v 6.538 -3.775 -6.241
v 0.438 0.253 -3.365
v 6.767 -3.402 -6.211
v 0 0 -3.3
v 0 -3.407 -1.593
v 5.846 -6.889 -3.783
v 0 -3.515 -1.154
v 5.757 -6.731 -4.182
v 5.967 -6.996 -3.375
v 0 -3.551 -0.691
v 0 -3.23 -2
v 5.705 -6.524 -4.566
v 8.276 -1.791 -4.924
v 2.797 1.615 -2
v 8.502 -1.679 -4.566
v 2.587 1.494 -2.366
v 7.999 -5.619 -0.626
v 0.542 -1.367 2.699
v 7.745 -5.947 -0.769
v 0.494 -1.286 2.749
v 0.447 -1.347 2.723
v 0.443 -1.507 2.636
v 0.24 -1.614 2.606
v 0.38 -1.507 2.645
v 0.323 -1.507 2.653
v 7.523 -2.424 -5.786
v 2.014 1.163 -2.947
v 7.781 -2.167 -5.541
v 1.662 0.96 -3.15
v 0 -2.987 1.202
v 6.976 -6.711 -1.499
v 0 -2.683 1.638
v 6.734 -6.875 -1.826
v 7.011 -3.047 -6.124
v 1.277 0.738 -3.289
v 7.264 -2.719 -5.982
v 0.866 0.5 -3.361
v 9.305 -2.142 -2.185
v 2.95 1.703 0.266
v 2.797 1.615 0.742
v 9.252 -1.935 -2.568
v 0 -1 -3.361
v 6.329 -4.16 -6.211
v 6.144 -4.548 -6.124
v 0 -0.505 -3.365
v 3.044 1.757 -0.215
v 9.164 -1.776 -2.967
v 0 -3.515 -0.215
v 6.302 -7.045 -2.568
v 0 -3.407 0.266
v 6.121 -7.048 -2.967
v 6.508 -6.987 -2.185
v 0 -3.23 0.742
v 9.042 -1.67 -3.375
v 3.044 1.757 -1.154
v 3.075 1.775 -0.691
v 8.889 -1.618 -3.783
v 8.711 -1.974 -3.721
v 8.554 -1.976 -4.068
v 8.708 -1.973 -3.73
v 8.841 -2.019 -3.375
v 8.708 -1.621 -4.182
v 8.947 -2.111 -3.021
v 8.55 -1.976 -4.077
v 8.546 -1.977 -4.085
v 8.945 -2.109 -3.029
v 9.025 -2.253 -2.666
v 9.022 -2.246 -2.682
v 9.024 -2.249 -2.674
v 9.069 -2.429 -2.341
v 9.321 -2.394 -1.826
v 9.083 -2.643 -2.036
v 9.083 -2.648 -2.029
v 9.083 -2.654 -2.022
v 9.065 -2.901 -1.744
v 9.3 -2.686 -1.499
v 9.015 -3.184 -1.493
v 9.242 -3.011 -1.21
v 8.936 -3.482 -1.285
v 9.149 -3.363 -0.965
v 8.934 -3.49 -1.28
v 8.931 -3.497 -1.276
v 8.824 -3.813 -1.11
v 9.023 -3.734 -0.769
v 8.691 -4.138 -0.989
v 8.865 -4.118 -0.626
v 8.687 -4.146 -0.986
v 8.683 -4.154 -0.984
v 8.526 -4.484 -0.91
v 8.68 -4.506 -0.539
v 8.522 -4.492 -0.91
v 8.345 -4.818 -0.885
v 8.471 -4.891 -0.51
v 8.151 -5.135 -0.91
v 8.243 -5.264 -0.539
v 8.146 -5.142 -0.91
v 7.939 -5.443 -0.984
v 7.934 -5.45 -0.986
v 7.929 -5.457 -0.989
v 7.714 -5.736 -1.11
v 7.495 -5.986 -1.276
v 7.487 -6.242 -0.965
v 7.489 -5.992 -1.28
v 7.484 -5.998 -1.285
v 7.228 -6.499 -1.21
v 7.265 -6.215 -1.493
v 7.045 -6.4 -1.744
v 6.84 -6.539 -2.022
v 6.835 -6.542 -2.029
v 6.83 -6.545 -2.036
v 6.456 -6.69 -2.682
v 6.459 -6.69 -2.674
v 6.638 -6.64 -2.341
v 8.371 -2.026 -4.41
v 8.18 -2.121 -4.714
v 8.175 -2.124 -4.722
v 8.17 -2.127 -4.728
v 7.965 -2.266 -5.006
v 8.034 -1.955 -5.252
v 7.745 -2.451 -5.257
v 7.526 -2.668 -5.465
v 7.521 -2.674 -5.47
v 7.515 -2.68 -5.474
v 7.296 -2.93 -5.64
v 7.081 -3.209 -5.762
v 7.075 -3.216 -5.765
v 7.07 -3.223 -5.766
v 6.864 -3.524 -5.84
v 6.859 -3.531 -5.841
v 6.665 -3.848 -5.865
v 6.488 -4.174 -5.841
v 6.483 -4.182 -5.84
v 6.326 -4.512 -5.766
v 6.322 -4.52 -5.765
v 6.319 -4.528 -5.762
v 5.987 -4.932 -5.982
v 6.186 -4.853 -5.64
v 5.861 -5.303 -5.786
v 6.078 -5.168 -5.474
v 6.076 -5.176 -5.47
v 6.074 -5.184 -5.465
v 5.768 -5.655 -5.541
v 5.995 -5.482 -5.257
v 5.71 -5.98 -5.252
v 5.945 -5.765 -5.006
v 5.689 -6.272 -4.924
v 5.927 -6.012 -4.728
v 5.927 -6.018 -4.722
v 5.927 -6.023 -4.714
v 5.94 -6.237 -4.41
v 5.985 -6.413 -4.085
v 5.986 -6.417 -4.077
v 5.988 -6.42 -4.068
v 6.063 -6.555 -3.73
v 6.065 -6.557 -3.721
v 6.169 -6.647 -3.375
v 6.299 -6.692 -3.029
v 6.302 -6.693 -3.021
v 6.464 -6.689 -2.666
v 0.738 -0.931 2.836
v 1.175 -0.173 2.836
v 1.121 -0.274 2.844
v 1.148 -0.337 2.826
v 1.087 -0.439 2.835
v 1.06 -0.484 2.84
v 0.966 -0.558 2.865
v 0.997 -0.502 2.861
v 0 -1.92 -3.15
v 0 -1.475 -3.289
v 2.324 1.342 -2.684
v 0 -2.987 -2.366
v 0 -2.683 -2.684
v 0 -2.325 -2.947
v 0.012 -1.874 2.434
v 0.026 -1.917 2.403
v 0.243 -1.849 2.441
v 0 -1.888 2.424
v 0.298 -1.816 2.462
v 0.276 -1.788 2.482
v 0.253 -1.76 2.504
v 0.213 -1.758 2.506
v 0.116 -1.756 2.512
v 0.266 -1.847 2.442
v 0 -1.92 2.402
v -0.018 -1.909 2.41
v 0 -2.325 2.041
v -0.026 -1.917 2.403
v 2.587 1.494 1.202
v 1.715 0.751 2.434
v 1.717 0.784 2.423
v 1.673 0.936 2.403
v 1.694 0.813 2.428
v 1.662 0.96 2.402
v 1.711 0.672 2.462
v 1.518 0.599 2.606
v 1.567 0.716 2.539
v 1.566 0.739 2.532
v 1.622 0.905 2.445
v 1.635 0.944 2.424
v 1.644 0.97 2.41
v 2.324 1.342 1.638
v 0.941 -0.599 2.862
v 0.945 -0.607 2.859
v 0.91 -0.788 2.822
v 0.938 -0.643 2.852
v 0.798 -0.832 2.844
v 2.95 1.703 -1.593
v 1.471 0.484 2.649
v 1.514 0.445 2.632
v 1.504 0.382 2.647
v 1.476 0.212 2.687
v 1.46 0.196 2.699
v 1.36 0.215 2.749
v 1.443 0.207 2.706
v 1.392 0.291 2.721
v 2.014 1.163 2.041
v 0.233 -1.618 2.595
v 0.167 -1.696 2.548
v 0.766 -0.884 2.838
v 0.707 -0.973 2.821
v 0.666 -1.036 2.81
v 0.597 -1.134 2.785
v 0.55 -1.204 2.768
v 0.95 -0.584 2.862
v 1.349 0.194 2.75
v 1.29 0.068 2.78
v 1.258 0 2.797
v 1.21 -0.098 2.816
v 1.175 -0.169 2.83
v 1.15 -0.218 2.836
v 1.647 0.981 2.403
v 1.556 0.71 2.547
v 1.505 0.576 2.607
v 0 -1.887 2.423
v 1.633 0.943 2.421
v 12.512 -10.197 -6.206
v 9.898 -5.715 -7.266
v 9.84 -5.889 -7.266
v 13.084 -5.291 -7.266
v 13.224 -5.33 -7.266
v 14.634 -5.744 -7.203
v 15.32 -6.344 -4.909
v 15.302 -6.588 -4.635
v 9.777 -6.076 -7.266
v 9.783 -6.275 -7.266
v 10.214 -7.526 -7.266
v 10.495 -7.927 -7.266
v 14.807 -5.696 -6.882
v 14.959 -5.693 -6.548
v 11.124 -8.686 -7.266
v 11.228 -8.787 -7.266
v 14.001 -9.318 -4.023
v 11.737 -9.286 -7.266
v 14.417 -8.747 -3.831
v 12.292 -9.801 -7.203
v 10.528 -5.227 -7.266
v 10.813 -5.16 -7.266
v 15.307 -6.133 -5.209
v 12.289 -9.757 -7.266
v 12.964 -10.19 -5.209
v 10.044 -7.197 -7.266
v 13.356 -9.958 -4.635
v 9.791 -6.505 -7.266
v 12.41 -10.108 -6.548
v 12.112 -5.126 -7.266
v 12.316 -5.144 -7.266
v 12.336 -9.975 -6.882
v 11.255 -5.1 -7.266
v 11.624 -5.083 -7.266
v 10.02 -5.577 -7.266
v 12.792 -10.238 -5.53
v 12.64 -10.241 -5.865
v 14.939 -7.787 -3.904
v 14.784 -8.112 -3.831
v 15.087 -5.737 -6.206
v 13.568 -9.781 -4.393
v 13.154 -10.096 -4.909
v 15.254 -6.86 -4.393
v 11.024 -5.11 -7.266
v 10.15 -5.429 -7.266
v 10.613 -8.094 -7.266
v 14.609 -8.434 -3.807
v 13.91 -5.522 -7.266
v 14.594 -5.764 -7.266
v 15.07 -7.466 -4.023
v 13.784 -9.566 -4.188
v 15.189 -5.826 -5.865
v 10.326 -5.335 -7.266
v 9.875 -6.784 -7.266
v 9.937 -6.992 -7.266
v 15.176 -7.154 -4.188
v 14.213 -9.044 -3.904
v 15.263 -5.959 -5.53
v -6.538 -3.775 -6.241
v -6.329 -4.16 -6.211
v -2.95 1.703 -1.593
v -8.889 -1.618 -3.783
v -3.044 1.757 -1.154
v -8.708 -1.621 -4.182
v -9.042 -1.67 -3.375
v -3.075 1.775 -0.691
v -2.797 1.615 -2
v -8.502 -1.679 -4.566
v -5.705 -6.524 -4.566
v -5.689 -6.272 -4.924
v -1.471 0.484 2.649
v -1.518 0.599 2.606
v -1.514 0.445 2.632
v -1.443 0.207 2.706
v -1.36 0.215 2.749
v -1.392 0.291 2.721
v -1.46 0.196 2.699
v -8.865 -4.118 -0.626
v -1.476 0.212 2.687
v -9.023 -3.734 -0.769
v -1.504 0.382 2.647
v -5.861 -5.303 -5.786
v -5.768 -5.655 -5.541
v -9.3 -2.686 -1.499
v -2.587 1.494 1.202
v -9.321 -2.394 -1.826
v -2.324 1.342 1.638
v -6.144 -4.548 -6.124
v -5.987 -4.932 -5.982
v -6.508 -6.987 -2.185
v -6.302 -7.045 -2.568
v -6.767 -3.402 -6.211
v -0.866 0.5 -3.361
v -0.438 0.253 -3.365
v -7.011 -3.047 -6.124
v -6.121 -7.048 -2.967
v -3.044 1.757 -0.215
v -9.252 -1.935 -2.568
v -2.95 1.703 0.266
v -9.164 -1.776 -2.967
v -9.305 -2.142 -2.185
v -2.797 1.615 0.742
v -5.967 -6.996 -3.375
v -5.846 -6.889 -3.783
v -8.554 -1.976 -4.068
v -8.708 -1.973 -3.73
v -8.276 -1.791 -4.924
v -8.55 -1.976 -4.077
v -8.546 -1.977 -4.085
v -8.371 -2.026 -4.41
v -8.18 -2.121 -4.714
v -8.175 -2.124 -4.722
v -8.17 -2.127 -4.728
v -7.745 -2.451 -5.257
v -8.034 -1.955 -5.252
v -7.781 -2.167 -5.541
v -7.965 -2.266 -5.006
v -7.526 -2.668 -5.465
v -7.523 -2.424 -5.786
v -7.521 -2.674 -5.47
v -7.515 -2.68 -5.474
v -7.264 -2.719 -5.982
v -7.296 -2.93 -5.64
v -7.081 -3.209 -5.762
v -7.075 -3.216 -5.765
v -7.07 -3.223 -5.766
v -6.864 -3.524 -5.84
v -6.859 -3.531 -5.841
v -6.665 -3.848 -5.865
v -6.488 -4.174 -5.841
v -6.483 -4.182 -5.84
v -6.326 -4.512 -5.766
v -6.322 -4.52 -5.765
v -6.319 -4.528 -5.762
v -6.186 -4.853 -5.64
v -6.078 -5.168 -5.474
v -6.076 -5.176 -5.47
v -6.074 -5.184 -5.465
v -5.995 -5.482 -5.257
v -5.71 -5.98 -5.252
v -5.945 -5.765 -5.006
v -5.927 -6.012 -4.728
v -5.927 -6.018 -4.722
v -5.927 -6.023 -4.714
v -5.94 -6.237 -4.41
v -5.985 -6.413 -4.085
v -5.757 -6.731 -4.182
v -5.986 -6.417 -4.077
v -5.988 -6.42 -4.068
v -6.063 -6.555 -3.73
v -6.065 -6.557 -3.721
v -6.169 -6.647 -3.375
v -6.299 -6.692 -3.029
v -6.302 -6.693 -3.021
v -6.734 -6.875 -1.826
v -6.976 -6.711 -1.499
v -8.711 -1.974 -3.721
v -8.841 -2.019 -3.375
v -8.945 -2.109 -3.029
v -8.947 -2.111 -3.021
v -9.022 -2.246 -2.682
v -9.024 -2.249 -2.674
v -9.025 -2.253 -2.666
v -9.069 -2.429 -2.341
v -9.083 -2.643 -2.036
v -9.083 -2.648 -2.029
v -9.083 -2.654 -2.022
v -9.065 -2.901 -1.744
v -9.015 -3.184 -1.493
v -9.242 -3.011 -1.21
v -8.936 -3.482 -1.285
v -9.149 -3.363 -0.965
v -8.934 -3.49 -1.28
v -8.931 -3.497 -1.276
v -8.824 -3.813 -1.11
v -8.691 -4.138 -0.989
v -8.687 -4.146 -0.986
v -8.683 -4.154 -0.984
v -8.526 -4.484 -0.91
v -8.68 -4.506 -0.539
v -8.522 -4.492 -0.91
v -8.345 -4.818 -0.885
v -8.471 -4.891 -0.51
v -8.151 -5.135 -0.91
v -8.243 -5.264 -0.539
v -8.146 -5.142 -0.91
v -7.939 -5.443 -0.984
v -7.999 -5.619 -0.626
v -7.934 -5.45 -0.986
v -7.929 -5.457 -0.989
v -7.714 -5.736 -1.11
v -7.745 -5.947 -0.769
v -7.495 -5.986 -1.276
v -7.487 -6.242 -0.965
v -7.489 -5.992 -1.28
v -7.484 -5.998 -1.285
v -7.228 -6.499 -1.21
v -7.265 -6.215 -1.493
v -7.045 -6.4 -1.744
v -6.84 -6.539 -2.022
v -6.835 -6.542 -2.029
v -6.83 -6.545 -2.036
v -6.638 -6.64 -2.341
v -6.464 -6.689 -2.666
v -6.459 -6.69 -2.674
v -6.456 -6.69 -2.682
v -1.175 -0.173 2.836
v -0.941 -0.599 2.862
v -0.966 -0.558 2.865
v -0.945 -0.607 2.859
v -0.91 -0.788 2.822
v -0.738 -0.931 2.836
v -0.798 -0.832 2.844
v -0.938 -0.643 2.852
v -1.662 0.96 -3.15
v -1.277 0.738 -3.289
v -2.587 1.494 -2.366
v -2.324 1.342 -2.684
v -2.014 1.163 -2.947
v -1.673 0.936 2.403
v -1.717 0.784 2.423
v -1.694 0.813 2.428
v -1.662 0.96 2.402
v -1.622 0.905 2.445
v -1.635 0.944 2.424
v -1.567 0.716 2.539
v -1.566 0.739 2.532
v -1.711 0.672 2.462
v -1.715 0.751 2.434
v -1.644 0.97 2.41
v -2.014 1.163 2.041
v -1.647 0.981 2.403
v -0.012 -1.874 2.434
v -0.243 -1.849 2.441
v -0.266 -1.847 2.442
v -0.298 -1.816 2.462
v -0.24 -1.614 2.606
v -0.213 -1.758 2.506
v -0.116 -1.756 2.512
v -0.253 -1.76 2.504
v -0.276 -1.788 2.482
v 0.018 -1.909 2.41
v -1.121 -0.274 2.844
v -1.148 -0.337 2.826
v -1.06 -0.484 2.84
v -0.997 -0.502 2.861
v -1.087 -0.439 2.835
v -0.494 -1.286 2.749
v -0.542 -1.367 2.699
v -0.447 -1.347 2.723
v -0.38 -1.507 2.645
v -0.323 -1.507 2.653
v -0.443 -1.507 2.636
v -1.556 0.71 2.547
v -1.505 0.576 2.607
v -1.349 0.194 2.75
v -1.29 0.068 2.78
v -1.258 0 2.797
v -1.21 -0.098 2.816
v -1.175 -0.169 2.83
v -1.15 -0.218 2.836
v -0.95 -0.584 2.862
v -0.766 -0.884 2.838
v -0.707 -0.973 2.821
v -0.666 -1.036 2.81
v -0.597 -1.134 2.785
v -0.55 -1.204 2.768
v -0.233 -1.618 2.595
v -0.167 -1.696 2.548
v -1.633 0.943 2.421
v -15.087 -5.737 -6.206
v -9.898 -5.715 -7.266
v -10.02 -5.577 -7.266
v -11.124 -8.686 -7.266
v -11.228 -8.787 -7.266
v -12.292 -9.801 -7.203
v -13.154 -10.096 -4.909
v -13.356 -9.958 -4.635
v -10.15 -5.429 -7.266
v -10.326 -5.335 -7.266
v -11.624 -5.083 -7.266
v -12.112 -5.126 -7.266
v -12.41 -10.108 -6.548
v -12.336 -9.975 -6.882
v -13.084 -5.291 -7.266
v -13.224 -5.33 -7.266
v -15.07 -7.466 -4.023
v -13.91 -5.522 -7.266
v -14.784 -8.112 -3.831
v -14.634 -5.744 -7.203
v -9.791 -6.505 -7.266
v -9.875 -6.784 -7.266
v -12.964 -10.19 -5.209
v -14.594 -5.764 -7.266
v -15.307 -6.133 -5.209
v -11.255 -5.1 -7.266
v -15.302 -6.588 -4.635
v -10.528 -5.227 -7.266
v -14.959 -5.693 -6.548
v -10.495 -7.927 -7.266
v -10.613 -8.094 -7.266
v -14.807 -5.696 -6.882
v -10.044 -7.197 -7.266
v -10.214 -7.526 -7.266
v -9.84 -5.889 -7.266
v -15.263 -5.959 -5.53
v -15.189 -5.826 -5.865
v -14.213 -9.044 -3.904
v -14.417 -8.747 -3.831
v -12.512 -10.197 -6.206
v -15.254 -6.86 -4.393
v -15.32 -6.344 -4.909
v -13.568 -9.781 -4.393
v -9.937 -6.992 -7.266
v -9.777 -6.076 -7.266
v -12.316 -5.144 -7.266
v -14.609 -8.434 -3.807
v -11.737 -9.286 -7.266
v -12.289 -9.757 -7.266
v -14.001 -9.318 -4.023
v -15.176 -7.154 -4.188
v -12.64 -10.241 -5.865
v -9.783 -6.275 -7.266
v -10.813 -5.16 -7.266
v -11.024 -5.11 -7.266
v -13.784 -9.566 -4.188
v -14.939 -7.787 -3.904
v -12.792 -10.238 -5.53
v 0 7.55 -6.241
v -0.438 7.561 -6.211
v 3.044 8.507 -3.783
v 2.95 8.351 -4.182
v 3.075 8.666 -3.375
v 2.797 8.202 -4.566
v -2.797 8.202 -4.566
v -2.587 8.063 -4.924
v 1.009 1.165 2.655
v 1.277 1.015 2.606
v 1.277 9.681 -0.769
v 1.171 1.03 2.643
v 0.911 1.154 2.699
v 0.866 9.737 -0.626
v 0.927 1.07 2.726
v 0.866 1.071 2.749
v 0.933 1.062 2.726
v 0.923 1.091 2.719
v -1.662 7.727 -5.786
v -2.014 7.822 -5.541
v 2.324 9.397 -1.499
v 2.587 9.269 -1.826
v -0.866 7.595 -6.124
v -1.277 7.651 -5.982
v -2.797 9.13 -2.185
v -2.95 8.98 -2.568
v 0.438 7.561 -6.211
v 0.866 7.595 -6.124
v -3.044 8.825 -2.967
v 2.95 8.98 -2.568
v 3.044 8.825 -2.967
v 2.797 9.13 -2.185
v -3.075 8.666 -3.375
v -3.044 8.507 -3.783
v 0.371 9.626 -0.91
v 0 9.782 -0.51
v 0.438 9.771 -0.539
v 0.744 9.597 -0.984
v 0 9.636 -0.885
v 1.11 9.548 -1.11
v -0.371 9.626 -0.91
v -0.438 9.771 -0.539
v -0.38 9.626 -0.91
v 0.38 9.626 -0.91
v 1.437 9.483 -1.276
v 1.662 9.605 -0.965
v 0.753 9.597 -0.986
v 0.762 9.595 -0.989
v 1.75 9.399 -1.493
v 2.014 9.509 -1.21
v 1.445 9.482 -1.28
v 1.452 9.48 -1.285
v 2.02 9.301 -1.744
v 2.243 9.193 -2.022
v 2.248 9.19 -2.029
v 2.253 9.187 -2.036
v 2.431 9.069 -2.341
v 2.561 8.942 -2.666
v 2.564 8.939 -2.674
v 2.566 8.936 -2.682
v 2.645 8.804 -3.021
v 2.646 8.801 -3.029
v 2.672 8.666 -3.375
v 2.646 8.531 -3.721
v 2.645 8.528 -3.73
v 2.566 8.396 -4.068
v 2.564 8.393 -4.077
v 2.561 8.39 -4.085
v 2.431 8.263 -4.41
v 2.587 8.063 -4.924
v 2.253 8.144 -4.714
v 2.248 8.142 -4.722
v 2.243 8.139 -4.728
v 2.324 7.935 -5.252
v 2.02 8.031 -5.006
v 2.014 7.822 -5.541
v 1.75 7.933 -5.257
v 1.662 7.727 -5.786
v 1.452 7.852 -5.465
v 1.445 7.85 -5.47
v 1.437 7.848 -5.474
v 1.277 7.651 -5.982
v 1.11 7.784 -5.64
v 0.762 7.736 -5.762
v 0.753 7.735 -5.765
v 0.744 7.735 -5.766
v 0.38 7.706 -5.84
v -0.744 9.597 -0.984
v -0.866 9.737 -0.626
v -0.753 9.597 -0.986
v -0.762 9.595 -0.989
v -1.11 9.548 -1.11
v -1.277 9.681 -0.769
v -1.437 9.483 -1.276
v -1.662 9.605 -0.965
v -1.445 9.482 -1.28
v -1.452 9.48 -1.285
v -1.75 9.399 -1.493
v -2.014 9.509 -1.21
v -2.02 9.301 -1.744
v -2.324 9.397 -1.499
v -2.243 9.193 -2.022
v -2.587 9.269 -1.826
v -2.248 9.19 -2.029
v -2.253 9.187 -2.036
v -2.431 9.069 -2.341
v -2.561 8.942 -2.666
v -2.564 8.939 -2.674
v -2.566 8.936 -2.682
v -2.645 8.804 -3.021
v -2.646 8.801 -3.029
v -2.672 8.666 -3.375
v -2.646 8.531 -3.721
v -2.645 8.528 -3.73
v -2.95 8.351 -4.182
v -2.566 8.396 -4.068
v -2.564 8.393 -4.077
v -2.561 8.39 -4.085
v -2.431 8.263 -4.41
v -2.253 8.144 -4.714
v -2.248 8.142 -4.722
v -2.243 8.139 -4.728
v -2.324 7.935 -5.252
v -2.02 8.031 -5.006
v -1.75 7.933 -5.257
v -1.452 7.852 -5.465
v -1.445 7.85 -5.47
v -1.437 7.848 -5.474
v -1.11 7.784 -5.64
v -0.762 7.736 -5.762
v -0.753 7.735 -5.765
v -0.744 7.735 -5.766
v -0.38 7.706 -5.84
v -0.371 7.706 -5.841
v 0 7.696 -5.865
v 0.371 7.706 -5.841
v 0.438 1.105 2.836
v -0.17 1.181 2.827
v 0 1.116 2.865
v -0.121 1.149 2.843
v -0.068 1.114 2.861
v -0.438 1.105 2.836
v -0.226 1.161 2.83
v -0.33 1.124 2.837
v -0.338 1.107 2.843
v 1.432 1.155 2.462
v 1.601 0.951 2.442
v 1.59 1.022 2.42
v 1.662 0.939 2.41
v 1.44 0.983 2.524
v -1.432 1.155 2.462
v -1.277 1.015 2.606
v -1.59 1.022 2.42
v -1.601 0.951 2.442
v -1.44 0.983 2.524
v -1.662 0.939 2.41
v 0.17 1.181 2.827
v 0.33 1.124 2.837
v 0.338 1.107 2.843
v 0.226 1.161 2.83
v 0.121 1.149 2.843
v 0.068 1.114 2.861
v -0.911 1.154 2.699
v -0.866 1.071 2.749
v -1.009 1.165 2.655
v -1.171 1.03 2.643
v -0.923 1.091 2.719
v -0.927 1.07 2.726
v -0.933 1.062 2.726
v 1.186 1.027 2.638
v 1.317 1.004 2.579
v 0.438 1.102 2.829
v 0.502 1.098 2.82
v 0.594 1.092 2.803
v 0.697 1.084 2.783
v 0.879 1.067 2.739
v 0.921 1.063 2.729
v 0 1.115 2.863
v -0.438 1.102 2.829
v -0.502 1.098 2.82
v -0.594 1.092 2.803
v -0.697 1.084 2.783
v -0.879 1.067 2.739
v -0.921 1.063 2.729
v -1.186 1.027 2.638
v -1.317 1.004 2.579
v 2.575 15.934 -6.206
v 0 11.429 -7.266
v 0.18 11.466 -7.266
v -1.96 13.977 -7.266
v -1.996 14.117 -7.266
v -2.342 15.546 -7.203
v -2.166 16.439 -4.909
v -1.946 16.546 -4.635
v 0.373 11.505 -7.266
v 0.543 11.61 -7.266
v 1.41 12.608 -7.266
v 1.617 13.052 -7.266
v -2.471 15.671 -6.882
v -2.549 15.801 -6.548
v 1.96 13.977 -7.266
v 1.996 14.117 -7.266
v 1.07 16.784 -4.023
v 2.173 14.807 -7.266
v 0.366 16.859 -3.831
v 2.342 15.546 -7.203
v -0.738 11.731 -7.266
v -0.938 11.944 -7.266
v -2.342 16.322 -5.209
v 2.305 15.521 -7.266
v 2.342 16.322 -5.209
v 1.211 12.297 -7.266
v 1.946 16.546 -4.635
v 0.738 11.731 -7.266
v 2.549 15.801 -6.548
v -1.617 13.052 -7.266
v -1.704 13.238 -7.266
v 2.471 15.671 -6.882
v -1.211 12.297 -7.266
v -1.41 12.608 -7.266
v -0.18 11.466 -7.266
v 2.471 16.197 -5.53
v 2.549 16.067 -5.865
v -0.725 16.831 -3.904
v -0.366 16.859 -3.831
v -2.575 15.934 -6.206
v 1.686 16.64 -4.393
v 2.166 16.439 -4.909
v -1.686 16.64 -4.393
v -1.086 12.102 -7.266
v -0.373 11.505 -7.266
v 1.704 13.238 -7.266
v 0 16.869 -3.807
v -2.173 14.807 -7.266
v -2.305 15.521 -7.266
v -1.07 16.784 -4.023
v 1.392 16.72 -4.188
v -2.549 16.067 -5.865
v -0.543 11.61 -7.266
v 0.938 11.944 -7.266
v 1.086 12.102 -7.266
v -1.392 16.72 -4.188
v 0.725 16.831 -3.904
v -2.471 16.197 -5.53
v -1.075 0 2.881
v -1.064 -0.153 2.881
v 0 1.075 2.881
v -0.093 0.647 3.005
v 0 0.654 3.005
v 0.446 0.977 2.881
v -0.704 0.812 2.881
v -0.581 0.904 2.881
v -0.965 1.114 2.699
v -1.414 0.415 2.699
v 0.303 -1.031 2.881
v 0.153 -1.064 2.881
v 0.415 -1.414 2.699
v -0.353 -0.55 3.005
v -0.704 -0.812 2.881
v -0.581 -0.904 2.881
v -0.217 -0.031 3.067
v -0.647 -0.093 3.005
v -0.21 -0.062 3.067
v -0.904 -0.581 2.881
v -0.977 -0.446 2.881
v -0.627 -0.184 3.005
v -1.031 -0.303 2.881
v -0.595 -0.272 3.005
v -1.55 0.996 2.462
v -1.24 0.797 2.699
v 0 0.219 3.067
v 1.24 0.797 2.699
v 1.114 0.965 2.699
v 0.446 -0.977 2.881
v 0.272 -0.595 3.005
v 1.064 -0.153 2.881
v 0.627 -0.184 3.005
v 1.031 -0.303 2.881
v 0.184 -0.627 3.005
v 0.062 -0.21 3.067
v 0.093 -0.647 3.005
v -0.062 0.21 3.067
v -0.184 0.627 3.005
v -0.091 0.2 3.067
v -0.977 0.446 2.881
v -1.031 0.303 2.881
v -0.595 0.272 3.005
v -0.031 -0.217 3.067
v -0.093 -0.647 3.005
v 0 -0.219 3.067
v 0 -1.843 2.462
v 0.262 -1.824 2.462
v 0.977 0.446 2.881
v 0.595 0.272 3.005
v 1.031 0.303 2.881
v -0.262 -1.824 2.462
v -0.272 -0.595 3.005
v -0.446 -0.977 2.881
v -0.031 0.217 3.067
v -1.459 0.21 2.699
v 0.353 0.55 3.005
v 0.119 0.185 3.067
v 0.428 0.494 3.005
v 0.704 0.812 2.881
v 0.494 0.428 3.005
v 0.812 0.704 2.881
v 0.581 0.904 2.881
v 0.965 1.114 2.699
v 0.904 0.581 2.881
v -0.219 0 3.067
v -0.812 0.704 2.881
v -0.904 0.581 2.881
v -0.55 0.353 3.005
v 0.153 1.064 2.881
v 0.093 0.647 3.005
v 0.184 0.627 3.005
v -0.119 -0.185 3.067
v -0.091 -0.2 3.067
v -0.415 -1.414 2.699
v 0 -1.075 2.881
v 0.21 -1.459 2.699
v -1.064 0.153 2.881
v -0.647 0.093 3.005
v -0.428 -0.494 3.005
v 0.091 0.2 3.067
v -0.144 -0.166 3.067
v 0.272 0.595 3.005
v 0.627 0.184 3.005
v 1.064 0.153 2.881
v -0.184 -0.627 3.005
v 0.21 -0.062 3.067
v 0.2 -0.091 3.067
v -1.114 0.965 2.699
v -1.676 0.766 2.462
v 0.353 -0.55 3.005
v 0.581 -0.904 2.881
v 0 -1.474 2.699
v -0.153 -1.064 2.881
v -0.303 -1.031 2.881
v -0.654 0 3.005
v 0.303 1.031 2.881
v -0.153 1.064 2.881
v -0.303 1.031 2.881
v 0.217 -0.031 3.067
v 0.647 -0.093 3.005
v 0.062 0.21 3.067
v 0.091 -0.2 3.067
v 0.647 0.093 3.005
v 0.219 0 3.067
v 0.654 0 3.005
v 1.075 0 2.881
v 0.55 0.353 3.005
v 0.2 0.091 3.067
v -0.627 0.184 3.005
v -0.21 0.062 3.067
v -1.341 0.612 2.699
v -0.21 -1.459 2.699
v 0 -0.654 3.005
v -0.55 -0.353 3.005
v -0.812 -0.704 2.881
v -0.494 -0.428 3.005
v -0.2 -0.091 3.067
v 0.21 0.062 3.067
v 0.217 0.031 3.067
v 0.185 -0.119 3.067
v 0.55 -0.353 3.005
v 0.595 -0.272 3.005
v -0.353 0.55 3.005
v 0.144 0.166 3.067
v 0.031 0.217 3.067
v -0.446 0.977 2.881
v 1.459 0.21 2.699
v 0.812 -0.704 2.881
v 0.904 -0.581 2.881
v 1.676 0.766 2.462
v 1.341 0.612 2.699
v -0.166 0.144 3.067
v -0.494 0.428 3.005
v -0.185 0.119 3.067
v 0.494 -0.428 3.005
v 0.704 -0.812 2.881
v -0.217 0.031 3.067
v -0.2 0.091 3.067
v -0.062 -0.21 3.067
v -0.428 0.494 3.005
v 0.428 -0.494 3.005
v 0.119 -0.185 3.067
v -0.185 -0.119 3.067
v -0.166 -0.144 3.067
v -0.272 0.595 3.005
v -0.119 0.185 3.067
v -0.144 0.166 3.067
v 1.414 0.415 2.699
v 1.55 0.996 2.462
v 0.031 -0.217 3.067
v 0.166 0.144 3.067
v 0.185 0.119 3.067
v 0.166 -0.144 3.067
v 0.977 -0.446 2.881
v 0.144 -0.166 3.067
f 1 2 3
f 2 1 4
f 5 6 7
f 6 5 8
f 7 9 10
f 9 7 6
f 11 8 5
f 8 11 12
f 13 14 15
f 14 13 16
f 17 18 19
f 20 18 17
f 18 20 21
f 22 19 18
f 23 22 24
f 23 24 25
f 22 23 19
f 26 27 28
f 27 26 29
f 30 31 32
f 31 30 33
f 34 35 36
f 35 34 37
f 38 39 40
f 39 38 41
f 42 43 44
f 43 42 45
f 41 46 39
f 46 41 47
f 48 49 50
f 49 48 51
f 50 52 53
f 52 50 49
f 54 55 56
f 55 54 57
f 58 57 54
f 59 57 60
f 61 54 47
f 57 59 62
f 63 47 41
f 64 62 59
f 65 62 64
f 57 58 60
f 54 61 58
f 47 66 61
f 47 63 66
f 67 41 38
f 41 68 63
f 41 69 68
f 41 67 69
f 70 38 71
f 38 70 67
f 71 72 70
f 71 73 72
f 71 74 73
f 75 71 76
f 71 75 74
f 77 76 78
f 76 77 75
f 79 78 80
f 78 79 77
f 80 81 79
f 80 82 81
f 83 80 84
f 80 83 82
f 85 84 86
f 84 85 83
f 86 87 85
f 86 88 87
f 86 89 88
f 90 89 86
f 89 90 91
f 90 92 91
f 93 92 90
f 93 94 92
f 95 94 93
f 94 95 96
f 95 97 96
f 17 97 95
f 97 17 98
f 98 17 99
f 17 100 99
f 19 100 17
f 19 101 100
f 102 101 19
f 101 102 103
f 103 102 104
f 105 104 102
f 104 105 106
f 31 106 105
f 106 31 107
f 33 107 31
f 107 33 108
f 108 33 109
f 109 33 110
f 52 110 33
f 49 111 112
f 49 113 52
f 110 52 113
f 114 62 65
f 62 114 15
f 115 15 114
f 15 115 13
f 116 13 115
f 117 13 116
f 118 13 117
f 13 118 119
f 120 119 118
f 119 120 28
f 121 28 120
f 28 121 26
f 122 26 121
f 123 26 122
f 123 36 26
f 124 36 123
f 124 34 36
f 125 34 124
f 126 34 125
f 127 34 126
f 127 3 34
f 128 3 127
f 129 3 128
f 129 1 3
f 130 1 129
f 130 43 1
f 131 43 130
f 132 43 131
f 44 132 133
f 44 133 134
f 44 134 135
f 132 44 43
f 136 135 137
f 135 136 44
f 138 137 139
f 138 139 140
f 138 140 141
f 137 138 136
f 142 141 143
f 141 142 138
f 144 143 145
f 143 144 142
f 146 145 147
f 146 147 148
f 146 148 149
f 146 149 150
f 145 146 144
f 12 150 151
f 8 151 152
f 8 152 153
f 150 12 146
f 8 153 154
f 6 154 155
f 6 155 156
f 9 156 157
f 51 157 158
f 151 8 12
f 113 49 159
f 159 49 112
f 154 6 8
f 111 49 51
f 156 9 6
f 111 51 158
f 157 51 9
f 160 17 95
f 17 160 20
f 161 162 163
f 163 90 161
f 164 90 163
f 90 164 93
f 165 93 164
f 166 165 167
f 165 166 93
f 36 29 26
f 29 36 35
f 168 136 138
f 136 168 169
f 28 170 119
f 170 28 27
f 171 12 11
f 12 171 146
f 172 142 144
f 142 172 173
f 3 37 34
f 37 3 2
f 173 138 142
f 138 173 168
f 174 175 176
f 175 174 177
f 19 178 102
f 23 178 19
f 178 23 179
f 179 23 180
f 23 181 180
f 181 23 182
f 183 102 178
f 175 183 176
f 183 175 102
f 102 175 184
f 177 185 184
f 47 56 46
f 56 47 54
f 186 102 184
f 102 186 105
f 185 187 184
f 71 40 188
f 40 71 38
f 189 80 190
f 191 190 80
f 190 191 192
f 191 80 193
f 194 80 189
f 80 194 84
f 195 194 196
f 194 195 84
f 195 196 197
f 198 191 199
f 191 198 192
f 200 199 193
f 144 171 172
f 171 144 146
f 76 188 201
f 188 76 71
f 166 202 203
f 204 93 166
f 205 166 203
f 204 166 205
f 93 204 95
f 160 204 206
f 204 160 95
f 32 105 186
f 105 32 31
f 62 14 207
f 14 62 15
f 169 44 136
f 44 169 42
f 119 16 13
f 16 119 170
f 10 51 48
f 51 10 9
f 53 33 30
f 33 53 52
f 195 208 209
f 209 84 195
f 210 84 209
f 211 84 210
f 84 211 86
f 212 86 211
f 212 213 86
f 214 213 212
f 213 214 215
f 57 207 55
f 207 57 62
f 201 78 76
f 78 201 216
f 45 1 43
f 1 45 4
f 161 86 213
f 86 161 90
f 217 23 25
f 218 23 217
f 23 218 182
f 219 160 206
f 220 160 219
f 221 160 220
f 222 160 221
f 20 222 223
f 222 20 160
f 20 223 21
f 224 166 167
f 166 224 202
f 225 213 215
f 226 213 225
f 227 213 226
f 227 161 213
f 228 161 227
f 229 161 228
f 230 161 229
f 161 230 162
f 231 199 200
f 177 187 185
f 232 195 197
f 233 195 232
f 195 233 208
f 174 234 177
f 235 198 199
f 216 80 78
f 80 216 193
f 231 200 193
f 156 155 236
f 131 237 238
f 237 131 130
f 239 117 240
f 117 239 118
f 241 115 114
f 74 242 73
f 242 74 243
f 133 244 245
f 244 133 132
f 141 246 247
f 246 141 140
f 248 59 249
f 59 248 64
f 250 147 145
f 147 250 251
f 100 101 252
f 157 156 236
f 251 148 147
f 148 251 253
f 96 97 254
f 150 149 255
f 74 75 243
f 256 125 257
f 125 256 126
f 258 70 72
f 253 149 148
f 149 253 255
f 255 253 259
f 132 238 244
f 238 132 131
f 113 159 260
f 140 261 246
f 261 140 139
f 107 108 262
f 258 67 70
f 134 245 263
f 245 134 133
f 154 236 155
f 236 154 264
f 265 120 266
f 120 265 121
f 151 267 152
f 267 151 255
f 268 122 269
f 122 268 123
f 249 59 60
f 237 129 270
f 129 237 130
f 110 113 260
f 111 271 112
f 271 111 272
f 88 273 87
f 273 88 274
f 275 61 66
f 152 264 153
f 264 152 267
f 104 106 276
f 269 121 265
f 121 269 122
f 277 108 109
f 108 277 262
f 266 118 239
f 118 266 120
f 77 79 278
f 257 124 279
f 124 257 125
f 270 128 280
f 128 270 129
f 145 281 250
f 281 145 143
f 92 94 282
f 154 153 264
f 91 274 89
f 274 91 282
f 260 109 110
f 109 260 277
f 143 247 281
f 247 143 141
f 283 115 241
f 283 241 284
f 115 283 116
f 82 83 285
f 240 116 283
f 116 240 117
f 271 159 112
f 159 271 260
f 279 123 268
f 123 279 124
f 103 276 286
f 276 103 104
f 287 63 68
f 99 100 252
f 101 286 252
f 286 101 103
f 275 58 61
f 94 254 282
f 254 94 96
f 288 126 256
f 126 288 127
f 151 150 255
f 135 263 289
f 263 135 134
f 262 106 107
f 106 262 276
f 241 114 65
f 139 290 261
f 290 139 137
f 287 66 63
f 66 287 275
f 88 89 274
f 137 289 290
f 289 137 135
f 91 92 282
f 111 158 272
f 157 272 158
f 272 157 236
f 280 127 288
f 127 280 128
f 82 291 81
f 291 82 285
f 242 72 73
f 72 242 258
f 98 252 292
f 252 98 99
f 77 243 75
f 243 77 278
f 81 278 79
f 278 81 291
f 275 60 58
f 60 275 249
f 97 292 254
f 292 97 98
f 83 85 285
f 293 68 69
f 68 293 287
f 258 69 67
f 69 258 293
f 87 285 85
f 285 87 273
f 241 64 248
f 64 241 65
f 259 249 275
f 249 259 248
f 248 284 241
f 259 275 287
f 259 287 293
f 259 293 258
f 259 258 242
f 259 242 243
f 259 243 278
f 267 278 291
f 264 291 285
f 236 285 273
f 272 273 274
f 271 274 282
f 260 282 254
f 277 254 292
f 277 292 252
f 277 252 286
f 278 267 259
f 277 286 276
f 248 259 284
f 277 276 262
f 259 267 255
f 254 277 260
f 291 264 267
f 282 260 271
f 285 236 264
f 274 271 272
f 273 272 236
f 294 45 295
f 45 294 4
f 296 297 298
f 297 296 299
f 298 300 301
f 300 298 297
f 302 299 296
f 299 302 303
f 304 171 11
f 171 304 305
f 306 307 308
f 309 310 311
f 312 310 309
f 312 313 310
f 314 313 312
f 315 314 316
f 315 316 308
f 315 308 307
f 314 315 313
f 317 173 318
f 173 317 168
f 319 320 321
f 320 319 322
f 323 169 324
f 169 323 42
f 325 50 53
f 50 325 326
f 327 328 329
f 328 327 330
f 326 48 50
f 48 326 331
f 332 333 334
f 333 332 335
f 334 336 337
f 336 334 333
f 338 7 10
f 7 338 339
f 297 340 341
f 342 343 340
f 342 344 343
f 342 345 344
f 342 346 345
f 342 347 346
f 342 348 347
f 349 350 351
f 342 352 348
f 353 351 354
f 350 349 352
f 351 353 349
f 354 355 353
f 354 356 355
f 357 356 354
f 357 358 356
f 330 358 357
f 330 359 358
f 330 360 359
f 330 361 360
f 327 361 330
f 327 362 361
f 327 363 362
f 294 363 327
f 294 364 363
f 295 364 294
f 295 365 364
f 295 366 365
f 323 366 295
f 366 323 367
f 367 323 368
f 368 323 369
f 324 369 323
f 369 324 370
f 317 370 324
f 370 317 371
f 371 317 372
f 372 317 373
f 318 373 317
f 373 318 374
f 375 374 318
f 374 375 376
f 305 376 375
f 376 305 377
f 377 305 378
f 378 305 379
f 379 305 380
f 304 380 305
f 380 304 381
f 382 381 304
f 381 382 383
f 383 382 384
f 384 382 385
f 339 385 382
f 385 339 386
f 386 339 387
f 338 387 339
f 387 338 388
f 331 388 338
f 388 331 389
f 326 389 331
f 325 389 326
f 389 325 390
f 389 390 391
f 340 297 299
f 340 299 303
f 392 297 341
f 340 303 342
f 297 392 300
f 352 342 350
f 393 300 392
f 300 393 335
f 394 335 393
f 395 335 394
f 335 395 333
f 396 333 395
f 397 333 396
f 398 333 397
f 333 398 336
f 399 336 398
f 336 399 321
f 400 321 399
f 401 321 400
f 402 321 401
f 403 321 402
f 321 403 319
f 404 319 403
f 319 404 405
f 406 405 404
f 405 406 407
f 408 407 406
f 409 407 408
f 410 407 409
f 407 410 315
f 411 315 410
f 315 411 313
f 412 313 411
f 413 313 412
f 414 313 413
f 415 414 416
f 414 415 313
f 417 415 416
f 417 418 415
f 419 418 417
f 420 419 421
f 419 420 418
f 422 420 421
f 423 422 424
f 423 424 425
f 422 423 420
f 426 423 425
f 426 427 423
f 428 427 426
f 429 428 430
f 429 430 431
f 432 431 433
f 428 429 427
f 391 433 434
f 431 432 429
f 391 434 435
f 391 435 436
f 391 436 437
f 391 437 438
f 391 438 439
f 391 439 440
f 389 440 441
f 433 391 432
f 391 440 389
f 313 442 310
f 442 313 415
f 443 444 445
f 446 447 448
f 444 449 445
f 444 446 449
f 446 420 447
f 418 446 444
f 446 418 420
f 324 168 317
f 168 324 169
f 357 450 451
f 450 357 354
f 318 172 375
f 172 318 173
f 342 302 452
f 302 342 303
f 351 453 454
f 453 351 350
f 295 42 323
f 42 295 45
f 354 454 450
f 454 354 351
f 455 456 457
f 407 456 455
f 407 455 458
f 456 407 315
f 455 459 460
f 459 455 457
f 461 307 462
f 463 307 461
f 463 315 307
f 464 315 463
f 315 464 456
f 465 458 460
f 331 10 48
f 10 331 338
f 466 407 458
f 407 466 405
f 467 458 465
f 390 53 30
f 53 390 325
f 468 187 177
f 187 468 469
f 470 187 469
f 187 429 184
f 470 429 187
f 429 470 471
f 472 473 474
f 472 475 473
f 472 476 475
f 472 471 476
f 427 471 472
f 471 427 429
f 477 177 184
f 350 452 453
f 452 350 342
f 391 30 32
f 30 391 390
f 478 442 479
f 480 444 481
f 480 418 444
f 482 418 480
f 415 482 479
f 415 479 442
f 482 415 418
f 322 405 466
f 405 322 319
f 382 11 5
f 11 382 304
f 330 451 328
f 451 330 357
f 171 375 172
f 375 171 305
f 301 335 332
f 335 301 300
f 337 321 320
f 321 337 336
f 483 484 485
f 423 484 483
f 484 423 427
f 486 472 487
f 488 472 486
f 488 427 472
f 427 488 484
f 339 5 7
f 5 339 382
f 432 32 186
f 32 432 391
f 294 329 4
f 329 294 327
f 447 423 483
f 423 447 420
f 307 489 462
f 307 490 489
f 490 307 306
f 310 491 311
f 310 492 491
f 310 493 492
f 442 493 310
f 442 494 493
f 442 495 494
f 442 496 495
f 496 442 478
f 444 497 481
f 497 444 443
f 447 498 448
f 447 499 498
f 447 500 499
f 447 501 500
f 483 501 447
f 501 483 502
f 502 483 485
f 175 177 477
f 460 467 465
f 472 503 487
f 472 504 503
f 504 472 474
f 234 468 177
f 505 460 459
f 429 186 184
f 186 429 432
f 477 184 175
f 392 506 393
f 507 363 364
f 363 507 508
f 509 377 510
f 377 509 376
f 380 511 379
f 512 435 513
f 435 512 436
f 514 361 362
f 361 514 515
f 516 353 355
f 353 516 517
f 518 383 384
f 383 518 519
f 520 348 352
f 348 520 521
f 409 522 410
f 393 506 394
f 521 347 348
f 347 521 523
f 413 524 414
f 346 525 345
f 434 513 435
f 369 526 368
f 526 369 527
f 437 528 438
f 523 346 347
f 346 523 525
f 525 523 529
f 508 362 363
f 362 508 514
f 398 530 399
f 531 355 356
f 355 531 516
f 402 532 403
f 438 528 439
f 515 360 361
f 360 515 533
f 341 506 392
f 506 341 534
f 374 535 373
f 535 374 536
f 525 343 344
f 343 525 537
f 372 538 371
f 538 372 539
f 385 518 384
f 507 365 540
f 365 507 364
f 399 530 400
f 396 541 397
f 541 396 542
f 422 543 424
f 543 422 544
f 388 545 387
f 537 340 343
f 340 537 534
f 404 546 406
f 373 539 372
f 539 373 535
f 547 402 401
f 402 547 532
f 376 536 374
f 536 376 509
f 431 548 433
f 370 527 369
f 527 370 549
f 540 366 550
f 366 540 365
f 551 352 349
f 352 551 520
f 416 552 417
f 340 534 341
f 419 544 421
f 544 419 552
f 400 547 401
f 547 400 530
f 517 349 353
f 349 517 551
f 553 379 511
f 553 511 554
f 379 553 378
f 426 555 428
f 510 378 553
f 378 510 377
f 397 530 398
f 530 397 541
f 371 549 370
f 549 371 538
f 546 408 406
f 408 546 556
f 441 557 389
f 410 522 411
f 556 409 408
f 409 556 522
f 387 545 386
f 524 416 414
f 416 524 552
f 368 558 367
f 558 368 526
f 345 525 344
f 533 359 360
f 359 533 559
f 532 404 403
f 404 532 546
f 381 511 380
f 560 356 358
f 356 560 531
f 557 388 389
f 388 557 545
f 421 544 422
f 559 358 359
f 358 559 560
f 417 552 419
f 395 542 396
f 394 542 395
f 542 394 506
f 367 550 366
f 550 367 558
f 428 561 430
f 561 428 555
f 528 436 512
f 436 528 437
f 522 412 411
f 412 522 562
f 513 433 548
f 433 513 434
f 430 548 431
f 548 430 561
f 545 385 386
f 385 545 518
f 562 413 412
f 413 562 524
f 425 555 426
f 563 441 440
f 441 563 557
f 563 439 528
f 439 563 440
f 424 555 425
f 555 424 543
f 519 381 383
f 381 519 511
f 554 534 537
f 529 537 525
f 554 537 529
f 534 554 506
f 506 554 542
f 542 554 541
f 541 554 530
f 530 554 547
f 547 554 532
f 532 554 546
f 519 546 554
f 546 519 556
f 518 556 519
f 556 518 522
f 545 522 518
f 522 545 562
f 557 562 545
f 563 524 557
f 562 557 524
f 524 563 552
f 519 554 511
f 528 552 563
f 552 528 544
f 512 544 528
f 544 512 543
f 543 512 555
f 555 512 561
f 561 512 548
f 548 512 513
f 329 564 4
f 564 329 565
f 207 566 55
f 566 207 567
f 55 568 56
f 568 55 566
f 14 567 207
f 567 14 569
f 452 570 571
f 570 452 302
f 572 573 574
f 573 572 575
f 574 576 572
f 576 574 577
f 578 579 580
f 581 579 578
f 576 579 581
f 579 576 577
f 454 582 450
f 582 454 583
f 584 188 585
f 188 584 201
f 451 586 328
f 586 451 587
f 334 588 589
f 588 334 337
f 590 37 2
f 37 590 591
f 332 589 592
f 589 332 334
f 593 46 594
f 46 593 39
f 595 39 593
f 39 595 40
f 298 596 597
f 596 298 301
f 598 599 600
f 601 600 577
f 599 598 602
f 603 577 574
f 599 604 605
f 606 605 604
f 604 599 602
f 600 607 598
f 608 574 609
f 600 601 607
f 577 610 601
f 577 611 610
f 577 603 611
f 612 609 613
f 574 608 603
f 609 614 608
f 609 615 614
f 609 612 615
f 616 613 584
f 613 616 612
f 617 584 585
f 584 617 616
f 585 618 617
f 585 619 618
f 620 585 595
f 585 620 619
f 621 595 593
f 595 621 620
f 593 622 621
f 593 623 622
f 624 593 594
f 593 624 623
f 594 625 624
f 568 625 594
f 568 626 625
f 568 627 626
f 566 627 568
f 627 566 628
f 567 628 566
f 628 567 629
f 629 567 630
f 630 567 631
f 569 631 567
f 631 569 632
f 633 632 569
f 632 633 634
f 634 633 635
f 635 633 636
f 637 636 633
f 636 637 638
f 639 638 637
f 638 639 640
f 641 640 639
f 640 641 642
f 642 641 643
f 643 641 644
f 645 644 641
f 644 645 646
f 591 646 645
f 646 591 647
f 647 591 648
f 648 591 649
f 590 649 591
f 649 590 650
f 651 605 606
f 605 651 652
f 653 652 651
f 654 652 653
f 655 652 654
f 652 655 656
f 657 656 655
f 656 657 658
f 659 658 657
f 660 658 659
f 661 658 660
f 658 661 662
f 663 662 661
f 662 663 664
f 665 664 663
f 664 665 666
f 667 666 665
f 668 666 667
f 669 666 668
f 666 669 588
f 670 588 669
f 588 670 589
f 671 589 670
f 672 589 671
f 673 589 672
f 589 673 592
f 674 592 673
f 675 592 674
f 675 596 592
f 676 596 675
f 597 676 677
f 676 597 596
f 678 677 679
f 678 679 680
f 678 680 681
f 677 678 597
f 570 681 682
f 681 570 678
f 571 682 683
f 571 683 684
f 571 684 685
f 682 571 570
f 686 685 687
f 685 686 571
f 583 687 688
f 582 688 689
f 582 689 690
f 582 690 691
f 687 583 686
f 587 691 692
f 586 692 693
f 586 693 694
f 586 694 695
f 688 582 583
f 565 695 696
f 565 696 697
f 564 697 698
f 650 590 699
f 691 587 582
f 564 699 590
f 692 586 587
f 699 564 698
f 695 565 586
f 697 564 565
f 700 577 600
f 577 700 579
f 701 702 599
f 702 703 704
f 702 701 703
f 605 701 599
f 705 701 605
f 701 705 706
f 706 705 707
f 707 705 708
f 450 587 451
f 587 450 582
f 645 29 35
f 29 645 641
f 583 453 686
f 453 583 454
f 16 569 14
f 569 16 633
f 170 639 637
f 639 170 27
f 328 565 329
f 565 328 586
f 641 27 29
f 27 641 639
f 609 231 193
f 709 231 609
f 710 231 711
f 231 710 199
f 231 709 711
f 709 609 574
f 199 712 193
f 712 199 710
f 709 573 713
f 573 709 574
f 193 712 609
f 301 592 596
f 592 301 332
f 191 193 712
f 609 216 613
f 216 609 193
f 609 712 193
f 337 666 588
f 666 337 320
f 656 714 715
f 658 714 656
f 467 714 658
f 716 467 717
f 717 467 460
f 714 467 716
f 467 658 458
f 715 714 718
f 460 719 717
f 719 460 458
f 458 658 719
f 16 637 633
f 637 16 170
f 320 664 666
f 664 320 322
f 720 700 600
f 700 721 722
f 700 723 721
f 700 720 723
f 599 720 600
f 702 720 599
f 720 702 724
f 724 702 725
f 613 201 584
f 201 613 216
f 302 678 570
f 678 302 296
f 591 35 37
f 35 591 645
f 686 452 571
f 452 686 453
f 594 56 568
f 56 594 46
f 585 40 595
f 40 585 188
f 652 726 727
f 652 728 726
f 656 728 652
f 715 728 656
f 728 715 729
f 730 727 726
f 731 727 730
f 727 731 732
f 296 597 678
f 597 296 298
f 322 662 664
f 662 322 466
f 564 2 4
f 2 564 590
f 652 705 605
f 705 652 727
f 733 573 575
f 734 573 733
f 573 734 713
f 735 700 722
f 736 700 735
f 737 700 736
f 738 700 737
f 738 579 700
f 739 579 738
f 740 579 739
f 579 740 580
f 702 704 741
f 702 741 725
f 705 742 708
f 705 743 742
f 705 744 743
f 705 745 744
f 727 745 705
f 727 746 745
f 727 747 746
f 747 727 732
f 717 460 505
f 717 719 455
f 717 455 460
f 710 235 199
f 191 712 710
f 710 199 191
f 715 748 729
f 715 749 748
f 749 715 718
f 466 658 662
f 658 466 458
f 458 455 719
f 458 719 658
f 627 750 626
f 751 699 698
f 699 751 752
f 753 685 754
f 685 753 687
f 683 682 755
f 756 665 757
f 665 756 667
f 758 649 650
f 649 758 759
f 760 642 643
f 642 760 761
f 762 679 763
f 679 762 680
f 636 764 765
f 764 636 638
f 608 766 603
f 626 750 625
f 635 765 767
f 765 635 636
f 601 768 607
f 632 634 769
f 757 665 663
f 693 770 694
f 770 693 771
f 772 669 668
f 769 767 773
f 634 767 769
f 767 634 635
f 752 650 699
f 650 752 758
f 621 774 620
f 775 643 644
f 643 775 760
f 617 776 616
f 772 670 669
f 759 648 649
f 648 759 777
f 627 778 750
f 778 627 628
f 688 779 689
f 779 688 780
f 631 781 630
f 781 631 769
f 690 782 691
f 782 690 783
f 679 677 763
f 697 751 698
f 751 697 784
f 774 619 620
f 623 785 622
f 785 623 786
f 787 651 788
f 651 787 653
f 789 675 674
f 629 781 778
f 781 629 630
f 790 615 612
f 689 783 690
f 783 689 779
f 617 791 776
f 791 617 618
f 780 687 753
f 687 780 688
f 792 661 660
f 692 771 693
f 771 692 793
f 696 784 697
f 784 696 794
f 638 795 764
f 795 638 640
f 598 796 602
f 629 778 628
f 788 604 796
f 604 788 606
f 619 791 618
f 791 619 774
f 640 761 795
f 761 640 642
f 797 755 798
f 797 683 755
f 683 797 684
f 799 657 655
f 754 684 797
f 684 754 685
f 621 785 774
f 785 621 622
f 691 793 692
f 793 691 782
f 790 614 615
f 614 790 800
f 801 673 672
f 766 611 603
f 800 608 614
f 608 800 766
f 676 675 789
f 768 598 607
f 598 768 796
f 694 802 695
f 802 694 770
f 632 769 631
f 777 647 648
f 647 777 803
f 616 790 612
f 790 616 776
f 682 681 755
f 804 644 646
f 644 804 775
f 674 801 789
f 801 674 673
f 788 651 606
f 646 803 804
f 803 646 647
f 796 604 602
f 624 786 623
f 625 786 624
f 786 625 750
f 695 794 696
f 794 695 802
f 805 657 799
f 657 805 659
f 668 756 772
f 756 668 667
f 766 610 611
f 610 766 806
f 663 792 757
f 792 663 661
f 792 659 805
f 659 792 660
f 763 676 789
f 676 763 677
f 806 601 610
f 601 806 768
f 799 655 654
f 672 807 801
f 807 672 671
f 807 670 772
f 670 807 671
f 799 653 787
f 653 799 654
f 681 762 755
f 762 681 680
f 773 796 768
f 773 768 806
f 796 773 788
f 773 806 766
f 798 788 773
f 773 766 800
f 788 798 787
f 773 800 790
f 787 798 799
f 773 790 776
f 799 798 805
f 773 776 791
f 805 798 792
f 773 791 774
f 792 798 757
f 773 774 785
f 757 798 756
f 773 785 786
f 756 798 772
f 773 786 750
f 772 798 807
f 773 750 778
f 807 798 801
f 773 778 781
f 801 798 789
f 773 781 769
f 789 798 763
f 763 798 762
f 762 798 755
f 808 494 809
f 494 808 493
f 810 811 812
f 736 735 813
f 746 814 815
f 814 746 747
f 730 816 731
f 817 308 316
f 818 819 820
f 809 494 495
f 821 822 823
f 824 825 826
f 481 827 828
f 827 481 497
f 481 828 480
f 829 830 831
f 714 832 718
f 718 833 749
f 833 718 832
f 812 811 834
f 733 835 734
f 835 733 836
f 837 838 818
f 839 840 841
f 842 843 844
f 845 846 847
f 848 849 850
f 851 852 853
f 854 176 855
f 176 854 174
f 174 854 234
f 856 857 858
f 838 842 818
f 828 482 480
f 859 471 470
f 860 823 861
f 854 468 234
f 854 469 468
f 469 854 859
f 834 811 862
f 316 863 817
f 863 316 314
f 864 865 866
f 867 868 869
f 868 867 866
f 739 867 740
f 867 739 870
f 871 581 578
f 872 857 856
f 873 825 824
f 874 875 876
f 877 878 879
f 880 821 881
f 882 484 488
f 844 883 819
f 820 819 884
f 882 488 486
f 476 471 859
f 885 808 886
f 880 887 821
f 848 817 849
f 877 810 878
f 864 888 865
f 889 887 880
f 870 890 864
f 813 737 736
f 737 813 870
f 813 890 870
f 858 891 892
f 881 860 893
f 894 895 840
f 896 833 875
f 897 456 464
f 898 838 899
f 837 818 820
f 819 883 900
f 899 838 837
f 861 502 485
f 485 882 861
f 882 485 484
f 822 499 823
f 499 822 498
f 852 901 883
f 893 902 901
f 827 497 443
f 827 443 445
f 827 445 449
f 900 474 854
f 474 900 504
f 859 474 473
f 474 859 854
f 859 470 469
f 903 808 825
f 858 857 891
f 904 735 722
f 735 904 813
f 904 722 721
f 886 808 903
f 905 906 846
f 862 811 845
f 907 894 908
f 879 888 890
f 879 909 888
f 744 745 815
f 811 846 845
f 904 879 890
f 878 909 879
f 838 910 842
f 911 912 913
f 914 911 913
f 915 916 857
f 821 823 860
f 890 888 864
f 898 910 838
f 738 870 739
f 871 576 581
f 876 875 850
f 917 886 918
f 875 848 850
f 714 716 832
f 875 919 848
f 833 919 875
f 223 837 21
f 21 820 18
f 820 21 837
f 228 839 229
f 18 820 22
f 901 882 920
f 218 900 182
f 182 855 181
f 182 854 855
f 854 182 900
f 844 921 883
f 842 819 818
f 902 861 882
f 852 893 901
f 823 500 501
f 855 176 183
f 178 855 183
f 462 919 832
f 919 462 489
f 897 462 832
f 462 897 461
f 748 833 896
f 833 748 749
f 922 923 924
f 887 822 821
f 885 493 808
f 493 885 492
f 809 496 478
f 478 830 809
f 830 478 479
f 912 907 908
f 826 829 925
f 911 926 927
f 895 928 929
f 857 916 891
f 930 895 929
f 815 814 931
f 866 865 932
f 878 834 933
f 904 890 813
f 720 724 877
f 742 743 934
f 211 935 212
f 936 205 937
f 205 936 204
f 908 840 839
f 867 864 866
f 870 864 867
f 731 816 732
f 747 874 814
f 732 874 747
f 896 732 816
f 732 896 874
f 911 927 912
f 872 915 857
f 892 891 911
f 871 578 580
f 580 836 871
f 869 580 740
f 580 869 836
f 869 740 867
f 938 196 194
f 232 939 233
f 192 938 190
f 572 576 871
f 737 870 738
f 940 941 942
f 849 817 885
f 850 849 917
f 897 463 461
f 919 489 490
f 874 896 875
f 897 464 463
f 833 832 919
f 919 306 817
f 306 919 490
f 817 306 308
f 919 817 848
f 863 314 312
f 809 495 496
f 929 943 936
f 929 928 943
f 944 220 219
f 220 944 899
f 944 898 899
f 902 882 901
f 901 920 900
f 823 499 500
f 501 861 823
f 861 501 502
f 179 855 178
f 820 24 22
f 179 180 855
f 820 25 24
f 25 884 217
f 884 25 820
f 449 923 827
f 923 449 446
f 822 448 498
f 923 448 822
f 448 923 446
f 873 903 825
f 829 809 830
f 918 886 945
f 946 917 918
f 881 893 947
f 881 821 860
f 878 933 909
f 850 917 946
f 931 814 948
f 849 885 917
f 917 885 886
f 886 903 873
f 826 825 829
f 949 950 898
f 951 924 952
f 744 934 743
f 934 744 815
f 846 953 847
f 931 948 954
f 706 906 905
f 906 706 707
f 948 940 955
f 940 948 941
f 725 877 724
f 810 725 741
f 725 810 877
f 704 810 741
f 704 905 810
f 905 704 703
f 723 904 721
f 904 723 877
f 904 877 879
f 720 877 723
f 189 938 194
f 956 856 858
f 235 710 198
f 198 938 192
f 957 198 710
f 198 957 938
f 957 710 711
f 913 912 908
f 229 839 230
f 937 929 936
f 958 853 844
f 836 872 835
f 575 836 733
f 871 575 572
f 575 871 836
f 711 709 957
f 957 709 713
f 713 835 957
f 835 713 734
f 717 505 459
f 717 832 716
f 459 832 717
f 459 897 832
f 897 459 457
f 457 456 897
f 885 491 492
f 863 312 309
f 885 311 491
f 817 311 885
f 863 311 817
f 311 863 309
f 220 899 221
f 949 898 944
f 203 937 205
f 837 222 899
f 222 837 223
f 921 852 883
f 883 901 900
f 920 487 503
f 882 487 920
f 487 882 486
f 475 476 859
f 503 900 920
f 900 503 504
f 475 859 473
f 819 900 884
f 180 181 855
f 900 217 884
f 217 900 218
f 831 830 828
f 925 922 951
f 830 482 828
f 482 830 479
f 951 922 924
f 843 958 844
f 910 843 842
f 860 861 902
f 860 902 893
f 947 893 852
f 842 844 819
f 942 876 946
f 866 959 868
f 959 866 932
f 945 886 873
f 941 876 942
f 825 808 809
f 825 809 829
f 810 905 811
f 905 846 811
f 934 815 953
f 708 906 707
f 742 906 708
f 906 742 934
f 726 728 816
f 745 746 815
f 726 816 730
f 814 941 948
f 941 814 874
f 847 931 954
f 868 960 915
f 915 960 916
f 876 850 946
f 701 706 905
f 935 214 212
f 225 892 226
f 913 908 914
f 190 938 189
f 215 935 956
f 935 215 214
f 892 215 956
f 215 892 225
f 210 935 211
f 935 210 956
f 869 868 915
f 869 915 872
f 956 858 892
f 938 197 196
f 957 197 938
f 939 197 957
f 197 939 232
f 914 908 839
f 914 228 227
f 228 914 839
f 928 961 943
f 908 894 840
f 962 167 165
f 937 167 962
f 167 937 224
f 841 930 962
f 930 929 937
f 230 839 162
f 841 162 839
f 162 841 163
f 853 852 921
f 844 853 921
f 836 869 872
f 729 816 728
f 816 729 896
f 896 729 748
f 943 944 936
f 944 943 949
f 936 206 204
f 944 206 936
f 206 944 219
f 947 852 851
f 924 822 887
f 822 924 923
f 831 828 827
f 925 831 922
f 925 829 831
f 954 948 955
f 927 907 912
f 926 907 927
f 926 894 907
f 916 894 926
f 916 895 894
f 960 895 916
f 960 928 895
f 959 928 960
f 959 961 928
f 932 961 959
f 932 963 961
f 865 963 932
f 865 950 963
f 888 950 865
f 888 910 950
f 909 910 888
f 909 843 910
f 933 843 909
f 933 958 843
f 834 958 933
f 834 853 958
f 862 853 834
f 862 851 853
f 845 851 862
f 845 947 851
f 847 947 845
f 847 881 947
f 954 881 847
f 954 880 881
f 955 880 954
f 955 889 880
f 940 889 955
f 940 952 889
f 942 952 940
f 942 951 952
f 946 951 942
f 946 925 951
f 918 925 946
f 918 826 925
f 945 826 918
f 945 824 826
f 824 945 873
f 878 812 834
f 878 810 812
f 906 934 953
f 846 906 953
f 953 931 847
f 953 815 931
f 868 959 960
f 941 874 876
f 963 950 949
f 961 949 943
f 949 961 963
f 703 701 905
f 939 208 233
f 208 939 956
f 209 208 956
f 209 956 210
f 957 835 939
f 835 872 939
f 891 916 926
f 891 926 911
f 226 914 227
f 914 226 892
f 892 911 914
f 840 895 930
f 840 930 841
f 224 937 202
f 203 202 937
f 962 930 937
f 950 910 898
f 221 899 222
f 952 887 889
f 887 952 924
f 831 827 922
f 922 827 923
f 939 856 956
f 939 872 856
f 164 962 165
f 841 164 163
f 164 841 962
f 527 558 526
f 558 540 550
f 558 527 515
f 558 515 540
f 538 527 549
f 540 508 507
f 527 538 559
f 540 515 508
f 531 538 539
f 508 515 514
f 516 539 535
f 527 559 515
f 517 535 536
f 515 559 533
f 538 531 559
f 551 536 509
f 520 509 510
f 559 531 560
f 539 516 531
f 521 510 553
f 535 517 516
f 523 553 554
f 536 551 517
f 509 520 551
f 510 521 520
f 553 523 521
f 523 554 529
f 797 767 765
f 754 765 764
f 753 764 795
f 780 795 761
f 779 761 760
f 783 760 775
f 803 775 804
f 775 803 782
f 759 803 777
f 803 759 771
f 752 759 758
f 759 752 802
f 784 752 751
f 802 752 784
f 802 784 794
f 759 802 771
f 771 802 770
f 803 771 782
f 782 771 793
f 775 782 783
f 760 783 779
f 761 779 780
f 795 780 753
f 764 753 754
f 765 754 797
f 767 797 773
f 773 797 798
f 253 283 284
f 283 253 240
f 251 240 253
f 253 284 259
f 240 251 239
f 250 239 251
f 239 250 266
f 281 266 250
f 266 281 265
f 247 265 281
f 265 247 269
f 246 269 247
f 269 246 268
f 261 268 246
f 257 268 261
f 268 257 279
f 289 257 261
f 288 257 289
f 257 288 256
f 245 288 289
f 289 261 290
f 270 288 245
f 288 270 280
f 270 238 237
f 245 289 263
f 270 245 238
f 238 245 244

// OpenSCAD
r = 5.35/2; // 5.35 pour Zortrax M200
rTrou = 4;
rayonCol = 0.4;
longueurCol= 2.8+6.5;
longueurEmbout = 8; //+2;
$fn=44;
// angle = 90-31.7174744;
// angle = 180-116.56;
angle = 68.72;
angleCube = -120*72/108;
echo(angleCube=angleCube);

rotate([180, 0, 0])

union() {
    difference() {
        union() {
            embouts();
            sphere(r+rayonCol);
        }
        // découpe base
        translate([0, 0, 0.42*(longueurCol+longueurEmbout)])
            cylinder(10, 50, 50);
    }
}

module embouts() {
    for (i = [1:3]) {
        rotate([0, 0, i*360/3])
        rotate([angle, 0, 0])
        embout(i);
        // rotate([0, 0, i*360/3+angleCube])
        // rotate([54.72, 0, 0])
        // embout(i);
    }
}

module embout(i) {
    difference() {
        union() {
            cylinder(longueurCol, r+rayonCol, r+rayonCol);
            translate([0, 0, longueurCol-0.2])
            cylinder(longueurEmbout, r, r-0.1);
        }
    }
}
